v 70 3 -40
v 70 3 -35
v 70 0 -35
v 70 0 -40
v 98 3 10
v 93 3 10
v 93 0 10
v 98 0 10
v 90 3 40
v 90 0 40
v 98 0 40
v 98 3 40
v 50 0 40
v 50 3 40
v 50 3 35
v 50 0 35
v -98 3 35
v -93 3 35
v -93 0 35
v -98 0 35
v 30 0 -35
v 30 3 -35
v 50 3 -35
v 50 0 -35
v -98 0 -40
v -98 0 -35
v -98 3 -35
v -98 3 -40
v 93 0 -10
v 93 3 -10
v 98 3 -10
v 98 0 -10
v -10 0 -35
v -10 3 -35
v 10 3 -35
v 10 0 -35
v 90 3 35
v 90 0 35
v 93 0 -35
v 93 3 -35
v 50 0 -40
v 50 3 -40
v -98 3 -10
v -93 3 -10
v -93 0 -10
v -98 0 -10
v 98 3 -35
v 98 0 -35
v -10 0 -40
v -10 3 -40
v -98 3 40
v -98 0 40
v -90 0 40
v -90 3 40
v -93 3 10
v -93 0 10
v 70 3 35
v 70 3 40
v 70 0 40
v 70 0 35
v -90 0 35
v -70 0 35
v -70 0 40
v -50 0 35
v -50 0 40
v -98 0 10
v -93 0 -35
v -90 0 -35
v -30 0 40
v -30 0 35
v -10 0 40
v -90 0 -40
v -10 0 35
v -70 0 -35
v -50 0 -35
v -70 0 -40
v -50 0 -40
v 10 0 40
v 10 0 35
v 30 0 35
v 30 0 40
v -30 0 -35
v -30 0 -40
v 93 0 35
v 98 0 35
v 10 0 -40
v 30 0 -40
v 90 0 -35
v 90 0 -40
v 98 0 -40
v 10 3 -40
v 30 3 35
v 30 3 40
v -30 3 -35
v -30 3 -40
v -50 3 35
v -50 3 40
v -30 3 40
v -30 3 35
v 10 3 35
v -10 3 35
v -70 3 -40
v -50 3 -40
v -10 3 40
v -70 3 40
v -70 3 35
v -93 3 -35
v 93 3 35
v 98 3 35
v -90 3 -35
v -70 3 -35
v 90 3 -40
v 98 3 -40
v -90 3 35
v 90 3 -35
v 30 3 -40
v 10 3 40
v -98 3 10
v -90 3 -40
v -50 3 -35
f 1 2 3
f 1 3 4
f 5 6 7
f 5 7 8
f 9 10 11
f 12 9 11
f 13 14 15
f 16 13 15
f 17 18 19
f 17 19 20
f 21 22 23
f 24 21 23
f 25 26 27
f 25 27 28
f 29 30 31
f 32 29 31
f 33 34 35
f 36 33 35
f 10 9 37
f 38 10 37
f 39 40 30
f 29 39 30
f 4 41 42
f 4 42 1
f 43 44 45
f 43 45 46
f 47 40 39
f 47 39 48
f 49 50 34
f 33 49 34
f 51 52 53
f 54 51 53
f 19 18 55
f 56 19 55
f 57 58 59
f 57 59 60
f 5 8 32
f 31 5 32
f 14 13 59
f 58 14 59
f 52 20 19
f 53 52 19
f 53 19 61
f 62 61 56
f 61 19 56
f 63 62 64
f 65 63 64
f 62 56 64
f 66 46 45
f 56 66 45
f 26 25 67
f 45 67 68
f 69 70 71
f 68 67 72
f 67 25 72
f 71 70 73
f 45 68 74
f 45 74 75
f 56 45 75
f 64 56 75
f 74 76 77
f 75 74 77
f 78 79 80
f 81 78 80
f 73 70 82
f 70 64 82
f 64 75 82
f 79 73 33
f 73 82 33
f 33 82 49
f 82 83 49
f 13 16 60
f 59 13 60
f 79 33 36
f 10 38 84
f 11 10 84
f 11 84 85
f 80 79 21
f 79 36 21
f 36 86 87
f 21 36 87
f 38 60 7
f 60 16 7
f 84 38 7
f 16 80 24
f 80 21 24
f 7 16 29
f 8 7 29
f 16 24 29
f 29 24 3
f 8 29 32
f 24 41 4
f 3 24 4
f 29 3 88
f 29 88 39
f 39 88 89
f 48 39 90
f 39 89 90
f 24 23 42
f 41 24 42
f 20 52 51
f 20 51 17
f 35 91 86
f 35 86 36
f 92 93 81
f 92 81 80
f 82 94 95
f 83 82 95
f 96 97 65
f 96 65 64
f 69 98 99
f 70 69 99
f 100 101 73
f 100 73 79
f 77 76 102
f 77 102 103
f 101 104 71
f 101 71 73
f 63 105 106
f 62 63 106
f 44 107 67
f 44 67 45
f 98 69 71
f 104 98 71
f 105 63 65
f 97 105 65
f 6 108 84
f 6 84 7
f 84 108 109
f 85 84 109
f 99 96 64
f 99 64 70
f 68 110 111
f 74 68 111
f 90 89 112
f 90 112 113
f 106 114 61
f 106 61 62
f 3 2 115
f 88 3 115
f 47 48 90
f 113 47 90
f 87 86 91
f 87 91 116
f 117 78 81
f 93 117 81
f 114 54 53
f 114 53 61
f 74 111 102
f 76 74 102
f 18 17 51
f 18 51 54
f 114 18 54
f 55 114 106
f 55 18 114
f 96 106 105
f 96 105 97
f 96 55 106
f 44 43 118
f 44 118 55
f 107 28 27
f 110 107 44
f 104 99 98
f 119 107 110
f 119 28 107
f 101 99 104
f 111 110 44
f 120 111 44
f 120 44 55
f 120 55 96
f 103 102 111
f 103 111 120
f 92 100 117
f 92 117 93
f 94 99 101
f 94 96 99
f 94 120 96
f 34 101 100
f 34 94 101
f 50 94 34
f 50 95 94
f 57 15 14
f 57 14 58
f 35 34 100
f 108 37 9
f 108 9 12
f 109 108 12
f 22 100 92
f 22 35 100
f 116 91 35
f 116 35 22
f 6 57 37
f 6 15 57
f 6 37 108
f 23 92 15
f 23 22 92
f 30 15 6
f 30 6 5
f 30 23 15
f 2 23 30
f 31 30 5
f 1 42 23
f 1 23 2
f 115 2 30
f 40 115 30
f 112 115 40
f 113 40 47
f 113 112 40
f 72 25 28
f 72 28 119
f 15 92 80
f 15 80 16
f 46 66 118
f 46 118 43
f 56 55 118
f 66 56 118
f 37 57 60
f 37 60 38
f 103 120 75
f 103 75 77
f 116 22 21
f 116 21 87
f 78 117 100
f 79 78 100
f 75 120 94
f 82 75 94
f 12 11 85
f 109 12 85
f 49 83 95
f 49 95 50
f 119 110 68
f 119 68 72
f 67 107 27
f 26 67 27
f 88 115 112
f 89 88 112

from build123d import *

# Parameters (mm, degrees)
SKETCH_1_W               = 196
SKETCH_1_H               = 80
EXTRUDE_1_DEPTH          = 3
CUT_EXTRUDE_1_REACH      = 107.891
SKETCH_2_W               = 20
SKETCH_2_H               = 5
PATTERN_LINEAR_1_COUNT   = 3
PATTERN_LINEAR_1_PITCH   = 40
PATTERN_LINEAR_2_COUNT   = 3
PATTERN_LINEAR_2_PITCH   = 40
CUT_EXTRUDE_2_REACH      = 107.891
SKETCH_3_W               = 5
SKETCH_3_H               = 25
MIRROR_2_COPY_1_REACH    = 107.891
MIRROR_2_COPY_1_SKETCH_W = 20
MIRROR_2_COPY_1_SKETCH_H = 5
MIRROR_2_COPY_2_REACH    = 107.891
MIRROR_2_COPY_2_SKETCH_W = 20
MIRROR_2_COPY_2_SKETCH_H = 5
MIRROR_2_COPY_3_REACH    = 107.891
MIRROR_2_COPY_3_SKETCH_W = 20
MIRROR_2_COPY_3_SKETCH_H = 5
MIRROR_2_COPY_4_REACH    = 107.891
MIRROR_2_COPY_4_SKETCH_W = 20
MIRROR_2_COPY_4_SKETCH_H = 5
MIRROR_5_COPY_1_REACH    = 107.891
MIRROR_5_COPY_1_SKETCH_W = 5
MIRROR_5_COPY_1_SKETCH_H = 25


with BuildPart() as part:
    # 스케치1 → 보스-돌출1 (new body)
    with BuildSketch(Plane(origin=(0, 0, 0), x_dir=(1, 0, 0), z_dir=(0, 1, 0))):
        Rectangle(SKETCH_1_W, SKETCH_1_H)
    extrude(amount=EXTRUDE_1_DEPTH)

    # 스케치2 → 컷-돌출1 (cut, up to next)
    with BuildSketch(Plane(origin=(0, 3, 0), x_dir=(1, 0, 0), z_dir=(0, 1, 0)), mode=Mode.PRIVATE) as cut_extrude_1_sk1:
        with Locations((0, -37.5)):
            Rectangle(SKETCH_2_W, SKETCH_2_H)
    cut_extrude_1_tool1 = extrude(cut_extrude_1_sk1.sketch, amount=-CUT_EXTRUDE_1_REACH, mode=Mode.PRIVATE) & part.part
    cut_extrude_1 = cut_extrude_1_tool1.solids().sort_by_distance((0, 3, 37.5))[0]
    add(cut_extrude_1, mode=Mode.SUBTRACT)

    # 선형 패턴1: 컷-돌출1 ×3
    with Locations(*[(i * PATTERN_LINEAR_1_PITCH, 0, 0) for i in range(1, PATTERN_LINEAR_1_COUNT)]):
        add(cut_extrude_1, mode=Mode.SUBTRACT)

    # 선형 패턴2: 컷-돌출1 ×3
    with Locations(*[(-i * PATTERN_LINEAR_2_PITCH, 0, 0) for i in range(1, PATTERN_LINEAR_2_COUNT)]):
        add(cut_extrude_1, mode=Mode.SUBTRACT)

    # 스케치3 → 컷-돌출2 (cut, up to next)
    with BuildSketch(Plane(origin=(0, 3, 0), x_dir=(1, 0, 0), z_dir=(0, 1, 0)), mode=Mode.PRIVATE) as cut_extrude_2_sk1:
        with Locations((95.5, -22.5)):
            Rectangle(SKETCH_3_W, SKETCH_3_H)
    cut_extrude_2_tool1 = extrude(cut_extrude_2_sk1.sketch, amount=-CUT_EXTRUDE_2_REACH, mode=Mode.PRIVATE) & part.part
    cut_extrude_2 = cut_extrude_2_tool1.solids().sort_by_distance((95.5, 3, 22.5))[0]
    add(cut_extrude_2, mode=Mode.SUBTRACT)

    # 대칭 복사2: 컷-돌출1 across plane
    add(cut_extrude_1.mirror(Plane.XY), mode=Mode.SUBTRACT)

    # 대칭 복사2 copy 1 sketch → 대칭 복사2 copy 1 (cut, up to next)
    with BuildSketch(Plane(origin=(40, 3, 0), x_dir=(1, 0, 0), z_dir=(0, 1, 0)), mode=Mode.PRIVATE) as mirror_2_copy_1_sk1:
        with Locations((0, 37.5)):
            Rectangle(MIRROR_2_COPY_1_SKETCH_W, MIRROR_2_COPY_1_SKETCH_H)
    mirror_2_copy_1_tool1 = extrude(mirror_2_copy_1_sk1.sketch, amount=-MIRROR_2_COPY_1_REACH, mode=Mode.PRIVATE) & part.part
    add(mirror_2_copy_1_tool1.solids().sort_by_distance((40, 3, -37.5))[0], mode=Mode.SUBTRACT)

    # 대칭 복사2 copy 2 sketch → 대칭 복사2 copy 2 (cut, up to next)
    with BuildSketch(Plane(origin=(80, 3, 0), x_dir=(1, 0, 0), z_dir=(0, 1, 0)), mode=Mode.PRIVATE) as mirror_2_copy_2_sk1:
        with Locations((0, 37.5)):
            Rectangle(MIRROR_2_COPY_2_SKETCH_W, MIRROR_2_COPY_2_SKETCH_H)
    mirror_2_copy_2_tool1 = extrude(mirror_2_copy_2_sk1.sketch, amount=-MIRROR_2_COPY_2_REACH, mode=Mode.PRIVATE) & part.part
    add(mirror_2_copy_2_tool1.solids().sort_by_distance((80, 3, -37.5))[0], mode=Mode.SUBTRACT)

    # 대칭 복사2 copy 3 sketch → 대칭 복사2 copy 3 (cut, up to next)
    with BuildSketch(Plane(origin=(-40, 3, 0), x_dir=(1, 0, 0), z_dir=(0, 1, 0)), mode=Mode.PRIVATE) as mirror_2_copy_3_sk1:
        with Locations((0, 37.5)):
            Rectangle(MIRROR_2_COPY_3_SKETCH_W, MIRROR_2_COPY_3_SKETCH_H)
    mirror_2_copy_3_tool1 = extrude(mirror_2_copy_3_sk1.sketch, amount=-MIRROR_2_COPY_3_REACH, mode=Mode.PRIVATE) & part.part
    add(mirror_2_copy_3_tool1.solids().sort_by_distance((-40, 3, -37.5))[0], mode=Mode.SUBTRACT)

    # 대칭 복사2 copy 4 sketch → 대칭 복사2 copy 4 (cut, up to next)
    with BuildSketch(Plane(origin=(-80, 3, 0), x_dir=(1, 0, 0), z_dir=(0, 1, 0)), mode=Mode.PRIVATE) as mirror_2_copy_4_sk1:
        with Locations((0, 37.5)):
            Rectangle(MIRROR_2_COPY_4_SKETCH_W, MIRROR_2_COPY_4_SKETCH_H)
    mirror_2_copy_4_tool1 = extrude(mirror_2_copy_4_sk1.sketch, amount=-MIRROR_2_COPY_4_REACH, mode=Mode.PRIVATE) & part.part
    add(mirror_2_copy_4_tool1.solids().sort_by_distance((-80, 3, -37.5))[0], mode=Mode.SUBTRACT)

    # 대칭 복사3: 컷-돌출2 across plane
    add(cut_extrude_2.mirror(Plane(origin=(0, 0, 0), x_dir=(0, 0, 1), z_dir=(1, 0, 0))), mode=Mode.SUBTRACT)

    # 대칭 복사5: 컷-돌출2 across plane
    add(cut_extrude_2.mirror(Plane.XY), mode=Mode.SUBTRACT)

    # 대칭 복사5 copy 1 sketch → 대칭 복사5 copy 1 (cut, up to next)
    with BuildSketch(Plane(origin=(0, 3, 0), x_dir=(-1, 0, 0), z_dir=(0, 1, 0)), mode=Mode.PRIVATE) as mirror_5_copy_1_sk1:
        with Locations((95.5, -22.5)):
            Rectangle(MIRROR_5_COPY_1_SKETCH_W, MIRROR_5_COPY_1_SKETCH_H)
    mirror_5_copy_1_tool1 = extrude(mirror_5_copy_1_sk1.sketch, amount=-MIRROR_5_COPY_1_REACH, mode=Mode.PRIVATE) & part.part
    add(mirror_5_copy_1_tool1.solids().sort_by_distance((-95.5, 3, -22.5))[0], mode=Mode.SUBTRACT)


solid = part.part
